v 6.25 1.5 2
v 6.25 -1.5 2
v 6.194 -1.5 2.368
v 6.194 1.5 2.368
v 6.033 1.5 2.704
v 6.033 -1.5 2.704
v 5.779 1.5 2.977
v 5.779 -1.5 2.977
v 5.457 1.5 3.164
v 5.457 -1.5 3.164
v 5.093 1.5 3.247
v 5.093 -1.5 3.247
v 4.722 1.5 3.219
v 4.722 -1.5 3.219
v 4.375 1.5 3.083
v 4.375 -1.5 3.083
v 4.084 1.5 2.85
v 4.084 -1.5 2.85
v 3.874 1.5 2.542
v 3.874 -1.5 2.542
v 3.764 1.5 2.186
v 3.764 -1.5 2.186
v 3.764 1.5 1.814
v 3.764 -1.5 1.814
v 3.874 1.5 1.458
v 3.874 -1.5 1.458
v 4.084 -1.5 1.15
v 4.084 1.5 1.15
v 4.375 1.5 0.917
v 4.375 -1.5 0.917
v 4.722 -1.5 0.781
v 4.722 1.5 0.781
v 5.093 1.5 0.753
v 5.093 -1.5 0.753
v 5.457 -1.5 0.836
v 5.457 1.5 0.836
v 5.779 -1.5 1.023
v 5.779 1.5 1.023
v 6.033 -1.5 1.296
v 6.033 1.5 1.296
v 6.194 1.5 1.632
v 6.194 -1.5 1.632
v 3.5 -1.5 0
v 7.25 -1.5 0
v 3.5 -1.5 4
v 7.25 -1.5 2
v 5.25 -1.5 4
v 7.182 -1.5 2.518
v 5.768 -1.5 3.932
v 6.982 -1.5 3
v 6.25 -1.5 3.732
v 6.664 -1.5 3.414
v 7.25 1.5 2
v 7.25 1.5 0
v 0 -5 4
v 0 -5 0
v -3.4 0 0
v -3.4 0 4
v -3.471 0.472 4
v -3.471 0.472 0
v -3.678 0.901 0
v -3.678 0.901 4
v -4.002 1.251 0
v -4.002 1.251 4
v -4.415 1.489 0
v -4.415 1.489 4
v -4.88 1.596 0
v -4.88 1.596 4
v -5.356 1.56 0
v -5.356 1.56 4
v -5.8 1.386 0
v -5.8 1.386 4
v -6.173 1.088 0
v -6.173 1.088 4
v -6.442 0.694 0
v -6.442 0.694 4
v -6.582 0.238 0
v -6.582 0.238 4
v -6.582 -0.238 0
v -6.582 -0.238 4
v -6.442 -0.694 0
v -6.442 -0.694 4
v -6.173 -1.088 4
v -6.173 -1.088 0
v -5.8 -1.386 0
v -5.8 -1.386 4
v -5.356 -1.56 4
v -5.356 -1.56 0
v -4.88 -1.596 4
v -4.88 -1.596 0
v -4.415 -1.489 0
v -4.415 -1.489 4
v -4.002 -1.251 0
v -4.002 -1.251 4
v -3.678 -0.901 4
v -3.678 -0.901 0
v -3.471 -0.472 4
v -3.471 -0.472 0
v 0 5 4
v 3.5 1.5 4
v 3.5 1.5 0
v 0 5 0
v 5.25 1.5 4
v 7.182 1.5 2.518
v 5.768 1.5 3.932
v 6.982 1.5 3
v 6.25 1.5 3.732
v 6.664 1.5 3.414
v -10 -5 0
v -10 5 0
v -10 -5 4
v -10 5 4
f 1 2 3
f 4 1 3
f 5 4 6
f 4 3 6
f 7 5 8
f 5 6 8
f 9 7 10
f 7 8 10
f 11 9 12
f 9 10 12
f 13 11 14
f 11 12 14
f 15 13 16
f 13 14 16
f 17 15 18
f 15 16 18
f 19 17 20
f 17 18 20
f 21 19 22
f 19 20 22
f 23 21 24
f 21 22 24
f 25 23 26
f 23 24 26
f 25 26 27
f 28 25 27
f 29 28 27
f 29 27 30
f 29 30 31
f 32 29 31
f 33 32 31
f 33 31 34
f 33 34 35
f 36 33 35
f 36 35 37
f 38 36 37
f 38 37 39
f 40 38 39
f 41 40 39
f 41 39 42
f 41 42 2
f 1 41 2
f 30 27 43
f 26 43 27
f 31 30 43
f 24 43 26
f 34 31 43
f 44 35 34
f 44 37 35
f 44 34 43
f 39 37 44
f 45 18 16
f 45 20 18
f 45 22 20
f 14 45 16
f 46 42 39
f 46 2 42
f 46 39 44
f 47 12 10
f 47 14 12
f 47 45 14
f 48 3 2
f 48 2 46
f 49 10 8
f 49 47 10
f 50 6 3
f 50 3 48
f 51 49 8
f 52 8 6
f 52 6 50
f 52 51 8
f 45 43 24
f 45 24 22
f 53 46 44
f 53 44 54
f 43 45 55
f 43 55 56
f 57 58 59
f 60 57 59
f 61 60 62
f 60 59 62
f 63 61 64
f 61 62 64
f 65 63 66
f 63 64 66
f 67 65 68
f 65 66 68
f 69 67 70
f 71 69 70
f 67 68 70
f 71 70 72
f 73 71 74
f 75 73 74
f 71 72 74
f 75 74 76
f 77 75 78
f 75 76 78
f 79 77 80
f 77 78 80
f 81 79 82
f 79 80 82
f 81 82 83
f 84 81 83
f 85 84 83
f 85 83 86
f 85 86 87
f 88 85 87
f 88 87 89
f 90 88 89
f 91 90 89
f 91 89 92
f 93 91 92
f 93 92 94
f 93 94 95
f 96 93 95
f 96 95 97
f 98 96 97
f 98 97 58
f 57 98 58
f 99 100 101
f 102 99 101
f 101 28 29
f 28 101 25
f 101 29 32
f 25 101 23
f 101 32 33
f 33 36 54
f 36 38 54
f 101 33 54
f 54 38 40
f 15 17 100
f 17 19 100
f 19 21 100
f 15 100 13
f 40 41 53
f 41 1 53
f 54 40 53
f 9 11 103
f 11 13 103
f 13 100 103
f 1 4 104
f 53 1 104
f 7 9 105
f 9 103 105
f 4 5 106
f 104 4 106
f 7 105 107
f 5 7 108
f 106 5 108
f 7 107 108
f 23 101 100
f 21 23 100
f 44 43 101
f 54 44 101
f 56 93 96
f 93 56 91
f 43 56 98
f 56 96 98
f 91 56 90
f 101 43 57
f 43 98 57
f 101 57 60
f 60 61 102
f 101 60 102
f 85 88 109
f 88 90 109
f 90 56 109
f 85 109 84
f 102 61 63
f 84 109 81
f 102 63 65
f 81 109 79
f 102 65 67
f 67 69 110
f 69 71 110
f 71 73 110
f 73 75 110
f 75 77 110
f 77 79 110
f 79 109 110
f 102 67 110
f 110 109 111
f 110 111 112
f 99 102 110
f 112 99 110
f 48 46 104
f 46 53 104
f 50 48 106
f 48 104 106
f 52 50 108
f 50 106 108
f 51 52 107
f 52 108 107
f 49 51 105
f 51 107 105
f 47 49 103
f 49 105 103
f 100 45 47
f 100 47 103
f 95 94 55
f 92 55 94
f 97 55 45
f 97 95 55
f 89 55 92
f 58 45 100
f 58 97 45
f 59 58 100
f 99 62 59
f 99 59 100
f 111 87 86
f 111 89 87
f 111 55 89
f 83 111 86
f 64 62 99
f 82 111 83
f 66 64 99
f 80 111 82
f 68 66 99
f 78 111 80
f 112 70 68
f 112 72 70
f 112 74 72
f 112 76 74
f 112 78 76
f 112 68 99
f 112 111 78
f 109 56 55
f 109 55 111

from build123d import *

# Parameters (mm, degrees)
SKETCH1_W           = 10
SKETCH1_H           = 20
BOSS_EXTRUDE1_DEPTH = 4
SKETCH2_R           = 1.6
CUT_EXTRUDE1_DEPTH  = 12.874342087
SKETCH3_R           = 1.25
CUT_EXTRUDE2_DEPTH  = 15.696938457
SKETCH4_W           = 2.75
SKETCH4_H           = 10
CUT_EXTRUDE3_DEPTH  = 12.874342087
SKETCH5_W           = 7.25
SKETCH5_H           = 3.5
CUT_EXTRUDE4_DEPTH  = 12.874342087
CHAMFER1_SIZE       = 3.5
FILLET1_R           = 2


with BuildPart() as part:
    # Sketch1 → Boss-Extrude1 (new body)
    with BuildSketch(Plane(origin=(0, 0, 0), x_dir=(0, 1, 0), z_dir=(0, 0, 1))):
        Rectangle(SKETCH1_W, SKETCH1_H)
    extrude(amount=BOSS_EXTRUDE1_DEPTH)

    # Sketch2 → Cut-Extrude1 (cut, through all)
    with BuildSketch(Plane.XY.offset(4)):
        with Locations((-5, 0)):
            Circle(SKETCH2_R)
    extrude(amount=-CUT_EXTRUDE1_DEPTH, mode=Mode.SUBTRACT)

    # Sketch3 → Cut-Extrude2 (cut, through all)
    with BuildSketch(Plane.XZ.offset(5)):
        with Locations((5, 2)):
            Circle(SKETCH3_R)
    extrude(amount=-CUT_EXTRUDE2_DEPTH, mode=Mode.SUBTRACT)

    # Sketch4 → Cut-Extrude3 (cut, through all)
    with BuildSketch(Plane.XY.offset(4)):
        with Locations((8.625, 0)):
            Rectangle(SKETCH4_W, SKETCH4_H)
    extrude(amount=-CUT_EXTRUDE3_DEPTH, mode=Mode.SUBTRACT)

    # Sketch5 → Cut-Extrude4 (cut, through all)
    with BuildSketch(Plane.XY.offset(4)):
        with Locations((3.625, 3.25)):
            Rectangle(SKETCH5_W, SKETCH5_H)
        with Locations((3.625, -3.25)):
            Rectangle(SKETCH5_W, SKETCH5_H)
    extrude(amount=-CUT_EXTRUDE4_DEPTH, mode=Mode.SUBTRACT)

    # Chamfer1
    chamfer1_edges = [part.edges().sort_by_distance(p)[0] for p in [
        (0, 1.5, 2),
        (0, -1.5, 2),
    ]]
    chamfer(chamfer1_edges, length=CHAMFER1_SIZE - 0.0001)  # a hair under: the kernel refuses the full size

    # Fillet1
    fillet1_edges = [part.edges().sort_by_distance(p)[0] for p in [
        (7.25, 0, 4),
    ]]
    fillet(fillet1_edges, radius=FILLET1_R)


solid = part.part
